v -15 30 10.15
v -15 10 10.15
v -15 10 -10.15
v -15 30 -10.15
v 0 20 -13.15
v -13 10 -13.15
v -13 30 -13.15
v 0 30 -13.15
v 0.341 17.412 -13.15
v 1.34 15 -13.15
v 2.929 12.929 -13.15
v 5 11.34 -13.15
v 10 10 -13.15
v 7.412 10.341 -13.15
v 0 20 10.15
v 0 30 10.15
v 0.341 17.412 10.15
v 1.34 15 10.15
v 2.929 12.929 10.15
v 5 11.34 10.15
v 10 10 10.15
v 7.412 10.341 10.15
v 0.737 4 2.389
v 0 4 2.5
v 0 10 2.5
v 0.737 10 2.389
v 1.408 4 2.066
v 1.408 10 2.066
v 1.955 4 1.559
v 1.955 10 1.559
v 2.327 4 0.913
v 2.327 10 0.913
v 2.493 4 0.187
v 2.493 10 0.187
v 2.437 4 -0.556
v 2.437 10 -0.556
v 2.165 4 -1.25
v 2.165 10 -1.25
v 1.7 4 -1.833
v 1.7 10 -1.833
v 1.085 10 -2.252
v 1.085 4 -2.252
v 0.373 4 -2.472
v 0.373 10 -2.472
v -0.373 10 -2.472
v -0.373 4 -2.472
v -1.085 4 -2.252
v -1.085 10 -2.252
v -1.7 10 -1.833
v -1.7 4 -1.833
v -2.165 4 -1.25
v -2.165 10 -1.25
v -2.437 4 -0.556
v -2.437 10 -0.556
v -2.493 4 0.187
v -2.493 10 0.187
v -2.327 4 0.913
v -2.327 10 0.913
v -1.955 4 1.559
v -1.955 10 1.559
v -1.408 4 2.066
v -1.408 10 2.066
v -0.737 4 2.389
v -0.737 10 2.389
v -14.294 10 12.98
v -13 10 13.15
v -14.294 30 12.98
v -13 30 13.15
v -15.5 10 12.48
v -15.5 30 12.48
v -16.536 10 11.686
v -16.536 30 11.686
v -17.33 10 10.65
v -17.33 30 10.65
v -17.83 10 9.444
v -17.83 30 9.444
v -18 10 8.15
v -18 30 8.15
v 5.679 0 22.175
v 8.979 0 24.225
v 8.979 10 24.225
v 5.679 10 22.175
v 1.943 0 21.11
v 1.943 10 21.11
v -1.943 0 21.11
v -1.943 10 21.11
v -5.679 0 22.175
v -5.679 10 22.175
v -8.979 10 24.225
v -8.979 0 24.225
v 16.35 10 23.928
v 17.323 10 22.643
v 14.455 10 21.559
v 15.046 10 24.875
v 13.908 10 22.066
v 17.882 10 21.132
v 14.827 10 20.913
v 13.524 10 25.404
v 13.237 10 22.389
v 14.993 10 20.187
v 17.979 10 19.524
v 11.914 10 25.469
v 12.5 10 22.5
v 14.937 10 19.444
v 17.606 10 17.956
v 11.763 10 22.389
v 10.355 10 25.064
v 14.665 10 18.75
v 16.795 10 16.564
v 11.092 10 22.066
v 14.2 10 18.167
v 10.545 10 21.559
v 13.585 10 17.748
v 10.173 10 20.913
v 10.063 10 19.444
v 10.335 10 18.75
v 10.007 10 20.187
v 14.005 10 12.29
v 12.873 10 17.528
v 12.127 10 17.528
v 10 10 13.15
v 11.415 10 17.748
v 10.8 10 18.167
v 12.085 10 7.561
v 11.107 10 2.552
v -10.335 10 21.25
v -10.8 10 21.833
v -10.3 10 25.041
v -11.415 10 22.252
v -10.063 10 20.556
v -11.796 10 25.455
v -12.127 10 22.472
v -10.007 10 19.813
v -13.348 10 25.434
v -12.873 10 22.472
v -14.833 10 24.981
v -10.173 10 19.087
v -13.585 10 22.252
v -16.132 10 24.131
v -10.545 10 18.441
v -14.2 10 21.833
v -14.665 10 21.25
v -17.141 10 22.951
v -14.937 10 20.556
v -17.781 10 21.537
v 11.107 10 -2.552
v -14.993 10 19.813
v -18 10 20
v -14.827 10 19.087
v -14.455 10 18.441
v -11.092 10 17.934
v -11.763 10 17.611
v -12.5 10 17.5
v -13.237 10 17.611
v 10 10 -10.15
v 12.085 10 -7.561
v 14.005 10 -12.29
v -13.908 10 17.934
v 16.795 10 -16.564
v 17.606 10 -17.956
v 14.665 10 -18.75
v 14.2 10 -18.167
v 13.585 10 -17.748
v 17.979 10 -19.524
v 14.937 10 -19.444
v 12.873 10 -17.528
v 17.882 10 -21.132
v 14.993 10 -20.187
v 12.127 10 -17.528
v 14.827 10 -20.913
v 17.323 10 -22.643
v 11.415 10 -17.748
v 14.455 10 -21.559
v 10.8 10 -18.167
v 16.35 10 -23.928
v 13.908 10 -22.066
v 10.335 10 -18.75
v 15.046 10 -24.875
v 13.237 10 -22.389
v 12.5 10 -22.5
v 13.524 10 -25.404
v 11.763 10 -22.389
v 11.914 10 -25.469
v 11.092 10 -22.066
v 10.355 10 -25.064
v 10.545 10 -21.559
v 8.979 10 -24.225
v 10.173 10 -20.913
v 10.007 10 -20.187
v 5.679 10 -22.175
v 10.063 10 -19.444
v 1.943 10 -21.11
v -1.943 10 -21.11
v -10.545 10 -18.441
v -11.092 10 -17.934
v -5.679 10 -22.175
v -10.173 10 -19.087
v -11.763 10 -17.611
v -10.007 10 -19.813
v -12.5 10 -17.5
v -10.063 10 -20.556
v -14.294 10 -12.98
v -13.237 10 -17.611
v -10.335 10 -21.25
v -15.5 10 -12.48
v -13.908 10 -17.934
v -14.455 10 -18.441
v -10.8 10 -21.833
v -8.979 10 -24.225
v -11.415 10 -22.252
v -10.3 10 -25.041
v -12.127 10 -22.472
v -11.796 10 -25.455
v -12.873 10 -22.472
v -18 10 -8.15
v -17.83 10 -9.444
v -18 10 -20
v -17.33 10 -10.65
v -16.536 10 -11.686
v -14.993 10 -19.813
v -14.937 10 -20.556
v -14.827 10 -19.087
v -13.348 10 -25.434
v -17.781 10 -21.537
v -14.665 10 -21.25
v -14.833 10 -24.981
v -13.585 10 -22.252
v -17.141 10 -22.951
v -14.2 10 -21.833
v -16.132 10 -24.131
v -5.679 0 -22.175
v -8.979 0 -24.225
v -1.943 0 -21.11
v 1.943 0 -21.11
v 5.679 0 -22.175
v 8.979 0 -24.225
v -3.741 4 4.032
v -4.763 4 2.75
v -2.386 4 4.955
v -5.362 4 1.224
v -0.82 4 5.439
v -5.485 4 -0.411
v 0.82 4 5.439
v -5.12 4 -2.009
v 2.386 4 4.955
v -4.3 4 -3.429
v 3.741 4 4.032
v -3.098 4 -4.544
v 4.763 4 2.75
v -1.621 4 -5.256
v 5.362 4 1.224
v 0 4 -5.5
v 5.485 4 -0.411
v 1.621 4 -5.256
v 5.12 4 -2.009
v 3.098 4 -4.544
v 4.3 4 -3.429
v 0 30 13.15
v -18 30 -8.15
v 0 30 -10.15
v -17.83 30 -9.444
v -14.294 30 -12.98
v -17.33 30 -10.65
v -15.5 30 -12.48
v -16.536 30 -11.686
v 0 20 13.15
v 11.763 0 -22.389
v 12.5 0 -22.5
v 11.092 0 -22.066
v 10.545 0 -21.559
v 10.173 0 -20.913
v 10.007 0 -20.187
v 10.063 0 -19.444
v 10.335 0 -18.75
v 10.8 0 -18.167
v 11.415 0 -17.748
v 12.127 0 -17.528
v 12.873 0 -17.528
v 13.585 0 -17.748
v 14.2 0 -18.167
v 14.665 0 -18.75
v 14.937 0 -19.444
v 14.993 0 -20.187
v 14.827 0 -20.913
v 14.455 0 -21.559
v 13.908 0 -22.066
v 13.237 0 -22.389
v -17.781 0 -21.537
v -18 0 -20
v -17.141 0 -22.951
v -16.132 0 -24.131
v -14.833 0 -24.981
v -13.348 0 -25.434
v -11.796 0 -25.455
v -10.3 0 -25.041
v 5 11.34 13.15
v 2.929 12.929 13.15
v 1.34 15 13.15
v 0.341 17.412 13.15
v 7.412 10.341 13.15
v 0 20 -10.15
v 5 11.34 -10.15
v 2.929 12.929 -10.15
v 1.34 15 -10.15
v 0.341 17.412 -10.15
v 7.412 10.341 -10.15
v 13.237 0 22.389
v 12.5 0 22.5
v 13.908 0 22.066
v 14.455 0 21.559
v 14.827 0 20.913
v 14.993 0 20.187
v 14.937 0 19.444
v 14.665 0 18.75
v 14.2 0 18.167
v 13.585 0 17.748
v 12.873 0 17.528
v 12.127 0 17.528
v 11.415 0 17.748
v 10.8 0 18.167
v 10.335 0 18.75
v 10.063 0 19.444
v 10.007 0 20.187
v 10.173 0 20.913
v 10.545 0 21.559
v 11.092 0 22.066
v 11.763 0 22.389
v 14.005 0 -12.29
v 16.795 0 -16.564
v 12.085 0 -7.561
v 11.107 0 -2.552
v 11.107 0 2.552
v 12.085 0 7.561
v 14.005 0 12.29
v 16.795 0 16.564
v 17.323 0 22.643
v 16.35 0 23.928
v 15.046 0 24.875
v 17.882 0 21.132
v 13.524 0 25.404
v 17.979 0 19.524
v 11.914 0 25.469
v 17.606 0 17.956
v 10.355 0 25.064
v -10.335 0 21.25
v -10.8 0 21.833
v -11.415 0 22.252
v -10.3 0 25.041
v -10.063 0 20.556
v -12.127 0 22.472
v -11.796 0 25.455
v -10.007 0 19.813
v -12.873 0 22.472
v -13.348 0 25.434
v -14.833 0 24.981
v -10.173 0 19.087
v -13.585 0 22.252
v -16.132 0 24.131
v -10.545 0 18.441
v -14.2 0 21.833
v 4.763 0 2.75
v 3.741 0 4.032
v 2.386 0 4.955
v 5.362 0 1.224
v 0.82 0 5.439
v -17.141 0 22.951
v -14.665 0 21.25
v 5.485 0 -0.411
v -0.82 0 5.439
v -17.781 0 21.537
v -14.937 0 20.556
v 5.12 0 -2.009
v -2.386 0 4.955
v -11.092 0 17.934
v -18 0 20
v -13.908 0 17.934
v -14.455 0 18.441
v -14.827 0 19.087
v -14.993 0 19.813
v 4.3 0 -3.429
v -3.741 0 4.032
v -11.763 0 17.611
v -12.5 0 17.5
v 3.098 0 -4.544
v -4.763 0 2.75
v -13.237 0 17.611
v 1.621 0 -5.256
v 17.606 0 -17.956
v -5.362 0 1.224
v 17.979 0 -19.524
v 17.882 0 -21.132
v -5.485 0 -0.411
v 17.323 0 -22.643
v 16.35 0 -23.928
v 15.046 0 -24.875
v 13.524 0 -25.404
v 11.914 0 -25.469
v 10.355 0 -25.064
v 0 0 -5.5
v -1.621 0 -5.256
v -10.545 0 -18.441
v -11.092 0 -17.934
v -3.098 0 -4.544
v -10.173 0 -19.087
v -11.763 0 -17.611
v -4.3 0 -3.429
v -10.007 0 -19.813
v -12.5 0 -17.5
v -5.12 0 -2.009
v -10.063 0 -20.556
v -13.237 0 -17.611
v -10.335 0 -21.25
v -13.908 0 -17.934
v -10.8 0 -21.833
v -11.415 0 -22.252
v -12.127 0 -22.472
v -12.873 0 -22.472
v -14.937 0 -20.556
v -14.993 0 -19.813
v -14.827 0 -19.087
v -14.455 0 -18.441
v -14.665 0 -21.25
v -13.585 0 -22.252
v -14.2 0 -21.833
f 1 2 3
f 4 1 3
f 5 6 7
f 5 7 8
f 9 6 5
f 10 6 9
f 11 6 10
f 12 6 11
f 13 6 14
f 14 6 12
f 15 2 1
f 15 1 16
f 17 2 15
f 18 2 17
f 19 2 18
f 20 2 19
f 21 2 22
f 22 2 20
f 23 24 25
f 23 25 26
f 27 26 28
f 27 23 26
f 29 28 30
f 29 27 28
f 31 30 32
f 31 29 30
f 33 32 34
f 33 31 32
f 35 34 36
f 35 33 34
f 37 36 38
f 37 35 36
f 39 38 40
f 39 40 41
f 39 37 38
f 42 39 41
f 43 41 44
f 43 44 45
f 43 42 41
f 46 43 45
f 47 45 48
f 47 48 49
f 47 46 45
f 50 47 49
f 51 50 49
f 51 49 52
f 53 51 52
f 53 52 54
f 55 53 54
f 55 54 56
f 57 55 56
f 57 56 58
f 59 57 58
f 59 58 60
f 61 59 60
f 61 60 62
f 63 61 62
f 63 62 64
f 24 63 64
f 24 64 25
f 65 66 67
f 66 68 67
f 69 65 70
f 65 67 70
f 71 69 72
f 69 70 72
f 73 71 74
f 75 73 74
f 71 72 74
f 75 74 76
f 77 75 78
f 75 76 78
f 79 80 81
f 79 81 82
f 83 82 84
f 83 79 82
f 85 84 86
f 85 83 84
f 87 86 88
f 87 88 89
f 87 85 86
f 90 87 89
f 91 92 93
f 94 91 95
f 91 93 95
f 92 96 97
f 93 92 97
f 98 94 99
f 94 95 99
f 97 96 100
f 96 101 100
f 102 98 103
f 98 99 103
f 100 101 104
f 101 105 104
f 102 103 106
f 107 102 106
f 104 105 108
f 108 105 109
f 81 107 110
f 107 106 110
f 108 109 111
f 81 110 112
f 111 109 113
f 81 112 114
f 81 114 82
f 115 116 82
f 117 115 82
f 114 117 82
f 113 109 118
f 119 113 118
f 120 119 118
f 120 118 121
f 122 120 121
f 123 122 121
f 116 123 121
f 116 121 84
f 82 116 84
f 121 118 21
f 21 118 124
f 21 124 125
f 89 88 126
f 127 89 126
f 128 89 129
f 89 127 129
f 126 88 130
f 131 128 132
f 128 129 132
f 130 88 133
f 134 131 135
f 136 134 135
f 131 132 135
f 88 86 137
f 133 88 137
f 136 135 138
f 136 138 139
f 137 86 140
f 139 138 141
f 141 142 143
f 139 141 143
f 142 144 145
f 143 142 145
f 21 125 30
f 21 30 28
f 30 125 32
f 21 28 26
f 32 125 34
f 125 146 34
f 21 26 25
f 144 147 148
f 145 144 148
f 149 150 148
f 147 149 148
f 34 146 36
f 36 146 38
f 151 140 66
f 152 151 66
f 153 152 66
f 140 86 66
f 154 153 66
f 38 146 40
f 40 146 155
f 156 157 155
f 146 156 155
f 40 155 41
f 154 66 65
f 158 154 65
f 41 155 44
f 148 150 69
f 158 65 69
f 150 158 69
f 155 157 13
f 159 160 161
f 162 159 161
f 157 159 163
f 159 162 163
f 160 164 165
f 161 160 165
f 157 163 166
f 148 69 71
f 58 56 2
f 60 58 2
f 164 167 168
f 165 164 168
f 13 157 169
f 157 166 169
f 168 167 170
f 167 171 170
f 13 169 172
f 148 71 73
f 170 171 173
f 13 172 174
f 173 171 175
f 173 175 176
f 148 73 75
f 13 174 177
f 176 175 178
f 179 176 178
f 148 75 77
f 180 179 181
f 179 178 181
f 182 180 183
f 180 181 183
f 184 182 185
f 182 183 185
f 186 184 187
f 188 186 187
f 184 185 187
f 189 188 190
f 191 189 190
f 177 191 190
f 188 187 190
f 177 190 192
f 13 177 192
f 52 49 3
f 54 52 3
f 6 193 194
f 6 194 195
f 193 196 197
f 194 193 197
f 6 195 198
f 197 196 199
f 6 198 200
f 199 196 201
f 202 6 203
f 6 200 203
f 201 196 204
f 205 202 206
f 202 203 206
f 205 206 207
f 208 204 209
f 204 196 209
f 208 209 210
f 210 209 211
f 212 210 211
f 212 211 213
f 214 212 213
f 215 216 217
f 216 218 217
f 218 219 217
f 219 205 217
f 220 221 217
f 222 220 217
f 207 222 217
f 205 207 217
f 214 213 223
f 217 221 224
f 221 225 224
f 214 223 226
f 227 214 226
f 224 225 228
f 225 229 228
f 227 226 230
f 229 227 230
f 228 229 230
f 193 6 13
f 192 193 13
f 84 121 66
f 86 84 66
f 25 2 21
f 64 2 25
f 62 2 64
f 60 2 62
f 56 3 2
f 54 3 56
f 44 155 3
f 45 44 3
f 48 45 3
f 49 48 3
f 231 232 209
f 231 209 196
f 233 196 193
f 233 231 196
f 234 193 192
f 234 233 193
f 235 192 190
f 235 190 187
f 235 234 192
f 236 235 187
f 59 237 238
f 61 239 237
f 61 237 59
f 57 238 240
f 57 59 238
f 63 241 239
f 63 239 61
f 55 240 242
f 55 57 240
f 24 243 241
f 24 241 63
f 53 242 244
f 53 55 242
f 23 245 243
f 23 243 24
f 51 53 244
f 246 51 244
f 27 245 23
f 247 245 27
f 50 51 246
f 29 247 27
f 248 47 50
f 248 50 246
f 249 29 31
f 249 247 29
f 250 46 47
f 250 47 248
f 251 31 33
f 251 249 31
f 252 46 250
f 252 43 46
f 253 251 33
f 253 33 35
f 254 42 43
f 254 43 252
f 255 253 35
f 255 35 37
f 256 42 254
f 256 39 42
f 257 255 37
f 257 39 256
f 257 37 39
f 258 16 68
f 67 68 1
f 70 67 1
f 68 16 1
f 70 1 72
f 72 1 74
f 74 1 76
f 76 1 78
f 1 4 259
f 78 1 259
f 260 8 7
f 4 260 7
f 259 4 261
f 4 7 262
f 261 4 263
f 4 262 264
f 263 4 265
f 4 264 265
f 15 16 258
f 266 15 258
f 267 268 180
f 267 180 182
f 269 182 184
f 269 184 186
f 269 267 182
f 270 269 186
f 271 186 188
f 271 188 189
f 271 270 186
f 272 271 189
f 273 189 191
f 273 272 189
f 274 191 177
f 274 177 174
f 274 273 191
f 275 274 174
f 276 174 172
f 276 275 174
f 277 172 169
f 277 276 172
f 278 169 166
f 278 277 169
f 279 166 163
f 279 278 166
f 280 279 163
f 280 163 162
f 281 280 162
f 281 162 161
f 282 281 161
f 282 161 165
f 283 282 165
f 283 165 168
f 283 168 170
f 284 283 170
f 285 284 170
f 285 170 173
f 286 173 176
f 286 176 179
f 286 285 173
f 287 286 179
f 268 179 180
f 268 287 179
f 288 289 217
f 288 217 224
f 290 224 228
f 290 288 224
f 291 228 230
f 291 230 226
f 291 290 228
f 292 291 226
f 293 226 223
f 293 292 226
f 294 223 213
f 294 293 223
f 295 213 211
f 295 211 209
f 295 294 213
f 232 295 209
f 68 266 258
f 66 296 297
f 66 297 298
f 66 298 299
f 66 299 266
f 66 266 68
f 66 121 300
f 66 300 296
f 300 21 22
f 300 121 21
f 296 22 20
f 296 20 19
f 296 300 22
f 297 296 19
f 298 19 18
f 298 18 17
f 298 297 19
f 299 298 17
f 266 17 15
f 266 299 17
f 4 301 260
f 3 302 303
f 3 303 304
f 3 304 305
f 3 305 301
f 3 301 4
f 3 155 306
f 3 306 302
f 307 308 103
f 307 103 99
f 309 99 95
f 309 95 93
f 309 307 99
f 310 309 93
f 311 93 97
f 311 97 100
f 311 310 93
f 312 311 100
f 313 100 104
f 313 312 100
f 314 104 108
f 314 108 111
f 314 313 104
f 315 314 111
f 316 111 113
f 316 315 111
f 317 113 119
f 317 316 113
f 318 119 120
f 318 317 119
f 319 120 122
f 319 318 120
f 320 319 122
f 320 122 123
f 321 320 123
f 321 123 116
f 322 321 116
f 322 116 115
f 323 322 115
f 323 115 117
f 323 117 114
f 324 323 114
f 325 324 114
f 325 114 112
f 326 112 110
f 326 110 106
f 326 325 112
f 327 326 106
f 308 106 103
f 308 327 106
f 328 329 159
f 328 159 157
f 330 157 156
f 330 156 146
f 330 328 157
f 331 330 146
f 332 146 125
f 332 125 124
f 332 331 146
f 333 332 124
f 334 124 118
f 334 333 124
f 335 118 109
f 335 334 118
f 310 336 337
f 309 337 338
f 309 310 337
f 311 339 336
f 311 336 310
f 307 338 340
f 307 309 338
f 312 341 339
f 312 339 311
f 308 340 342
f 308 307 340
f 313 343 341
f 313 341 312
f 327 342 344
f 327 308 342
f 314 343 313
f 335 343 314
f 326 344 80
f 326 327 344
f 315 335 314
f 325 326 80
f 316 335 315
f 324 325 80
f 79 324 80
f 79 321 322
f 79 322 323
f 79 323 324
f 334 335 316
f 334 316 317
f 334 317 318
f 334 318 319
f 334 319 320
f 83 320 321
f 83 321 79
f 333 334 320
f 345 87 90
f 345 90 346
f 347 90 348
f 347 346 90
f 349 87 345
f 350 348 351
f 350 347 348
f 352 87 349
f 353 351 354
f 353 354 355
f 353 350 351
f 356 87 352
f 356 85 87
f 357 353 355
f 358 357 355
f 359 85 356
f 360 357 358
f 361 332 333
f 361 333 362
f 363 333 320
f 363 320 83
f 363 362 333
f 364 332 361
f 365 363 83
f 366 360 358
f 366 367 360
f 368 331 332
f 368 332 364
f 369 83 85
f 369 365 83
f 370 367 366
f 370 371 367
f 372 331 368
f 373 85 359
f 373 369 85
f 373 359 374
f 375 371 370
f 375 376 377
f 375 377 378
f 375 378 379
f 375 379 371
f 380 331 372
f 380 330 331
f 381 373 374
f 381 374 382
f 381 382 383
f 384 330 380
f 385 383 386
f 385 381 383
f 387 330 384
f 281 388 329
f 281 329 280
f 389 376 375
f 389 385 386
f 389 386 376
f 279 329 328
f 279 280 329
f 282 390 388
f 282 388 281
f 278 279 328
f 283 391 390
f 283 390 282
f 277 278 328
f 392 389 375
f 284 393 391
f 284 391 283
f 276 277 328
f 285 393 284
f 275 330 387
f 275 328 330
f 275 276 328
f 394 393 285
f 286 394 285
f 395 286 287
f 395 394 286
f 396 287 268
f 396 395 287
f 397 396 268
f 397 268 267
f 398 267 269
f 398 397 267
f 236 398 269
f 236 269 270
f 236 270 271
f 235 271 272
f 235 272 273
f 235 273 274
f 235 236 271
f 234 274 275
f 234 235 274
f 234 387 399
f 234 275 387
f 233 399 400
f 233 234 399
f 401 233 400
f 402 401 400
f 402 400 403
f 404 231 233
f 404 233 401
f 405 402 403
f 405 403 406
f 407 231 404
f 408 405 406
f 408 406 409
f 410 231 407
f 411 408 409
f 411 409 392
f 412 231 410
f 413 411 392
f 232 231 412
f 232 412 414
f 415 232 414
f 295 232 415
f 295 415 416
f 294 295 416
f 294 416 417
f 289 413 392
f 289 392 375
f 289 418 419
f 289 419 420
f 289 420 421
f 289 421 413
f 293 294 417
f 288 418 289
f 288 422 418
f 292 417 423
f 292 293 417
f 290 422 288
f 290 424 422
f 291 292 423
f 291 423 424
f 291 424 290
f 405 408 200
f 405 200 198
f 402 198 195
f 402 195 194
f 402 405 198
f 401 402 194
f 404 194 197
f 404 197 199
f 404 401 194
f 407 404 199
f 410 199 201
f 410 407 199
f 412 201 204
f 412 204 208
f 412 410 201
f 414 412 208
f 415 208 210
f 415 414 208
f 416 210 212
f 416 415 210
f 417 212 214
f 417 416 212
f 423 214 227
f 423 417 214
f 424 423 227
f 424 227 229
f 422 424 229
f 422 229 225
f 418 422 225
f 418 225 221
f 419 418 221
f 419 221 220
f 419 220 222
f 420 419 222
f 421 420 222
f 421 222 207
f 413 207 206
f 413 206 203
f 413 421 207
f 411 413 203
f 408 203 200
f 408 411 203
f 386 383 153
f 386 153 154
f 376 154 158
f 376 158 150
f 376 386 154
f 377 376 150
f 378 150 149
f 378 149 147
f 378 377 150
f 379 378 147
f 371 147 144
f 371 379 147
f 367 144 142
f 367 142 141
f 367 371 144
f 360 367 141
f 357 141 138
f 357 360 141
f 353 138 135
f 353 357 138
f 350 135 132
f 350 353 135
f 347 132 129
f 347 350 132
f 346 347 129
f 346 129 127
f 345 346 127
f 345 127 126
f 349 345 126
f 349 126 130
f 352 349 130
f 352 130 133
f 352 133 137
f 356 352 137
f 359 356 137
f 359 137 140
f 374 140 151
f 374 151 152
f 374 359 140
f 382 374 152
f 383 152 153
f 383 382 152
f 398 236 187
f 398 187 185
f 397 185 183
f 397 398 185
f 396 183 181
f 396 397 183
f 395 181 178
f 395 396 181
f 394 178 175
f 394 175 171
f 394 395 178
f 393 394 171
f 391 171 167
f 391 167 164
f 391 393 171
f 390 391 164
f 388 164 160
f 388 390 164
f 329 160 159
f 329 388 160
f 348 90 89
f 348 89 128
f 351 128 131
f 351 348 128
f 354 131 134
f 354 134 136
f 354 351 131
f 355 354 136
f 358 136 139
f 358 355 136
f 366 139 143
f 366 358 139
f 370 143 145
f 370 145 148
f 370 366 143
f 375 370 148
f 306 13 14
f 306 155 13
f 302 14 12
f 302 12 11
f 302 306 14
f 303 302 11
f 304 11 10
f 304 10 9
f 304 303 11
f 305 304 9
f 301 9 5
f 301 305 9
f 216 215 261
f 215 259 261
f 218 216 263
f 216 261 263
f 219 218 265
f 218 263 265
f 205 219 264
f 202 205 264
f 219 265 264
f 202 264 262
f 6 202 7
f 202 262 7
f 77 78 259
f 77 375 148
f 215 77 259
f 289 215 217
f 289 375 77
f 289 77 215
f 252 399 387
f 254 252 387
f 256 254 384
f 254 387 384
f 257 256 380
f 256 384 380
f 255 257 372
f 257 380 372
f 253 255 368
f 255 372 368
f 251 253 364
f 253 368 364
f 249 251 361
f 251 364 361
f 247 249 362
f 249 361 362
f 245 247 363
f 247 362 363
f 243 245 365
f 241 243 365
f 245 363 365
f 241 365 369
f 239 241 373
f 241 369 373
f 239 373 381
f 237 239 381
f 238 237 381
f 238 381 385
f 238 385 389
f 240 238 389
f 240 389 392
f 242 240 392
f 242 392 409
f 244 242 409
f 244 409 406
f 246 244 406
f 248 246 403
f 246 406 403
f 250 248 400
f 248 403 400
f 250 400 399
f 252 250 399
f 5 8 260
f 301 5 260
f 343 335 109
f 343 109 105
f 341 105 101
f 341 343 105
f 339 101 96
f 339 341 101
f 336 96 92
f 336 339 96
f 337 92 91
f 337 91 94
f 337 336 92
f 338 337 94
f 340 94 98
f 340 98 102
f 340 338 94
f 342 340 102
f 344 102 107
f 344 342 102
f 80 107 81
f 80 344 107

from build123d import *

# Parameters (mm, degrees)
SKETCH1_R           = 2.5
BOSS_EXTRUDE1_DEPTH = 10
SKETCH3_R           = 5.5
CUT_EXTRUDE1_DEPTH  = 4
BOSS_EXTRUDE2_DEPTH = 20
FILLET1_R           = 10
FILLET2_R           = 5


with BuildPart() as part:
    # Sketch1 → Boss-Extrude1 (new body)
    with BuildSketch(Plane(origin=(0, 0, 0), x_dir=(1, 0, 0), z_dir=(0, 1, 0))):
        with BuildLine():
            Line((-18, -20), (-18, 20))
            ThreePointArc((-18, 20), (-14.832854679, 24.980741817), (-8.978985802, 24.225217038))
            ThreePointArc((-8.978985802, 24.225217038), (0, 20.97437581), (8.978985802, 24.225217038))
            ThreePointArc((8.978985802, 24.225217038), (16.350007855, 23.927777936), (16.794778452, 16.564177238))
            ThreePointArc((16.794778452, 16.564177238), (10.984378813, 0), (16.794778452, -16.564177238))
            ThreePointArc((16.794778452, -16.564177238), (16.350007855, -23.927777936), (8.978985802, -24.225217038))
            ThreePointArc((8.978985802, -24.225217038), (0, -20.97437581), (-8.978985802, -24.225217038))
            ThreePointArc((-8.978985802, -24.225217038), (-14.832854679, -24.980741817), (-18, -20))
        make_face()
        with Locations(Location((-12.5, 20, 0), (0, 0, 270))):
            Circle(SKETCH1_R, mode=Mode.SUBTRACT)
        with Locations(Location((12.5, 20, 0), (0, 0, 90))):
            Circle(SKETCH1_R, mode=Mode.SUBTRACT)
        with Locations(Location((12.5, -20, 0), (0, 0, 270))):
            Circle(SKETCH1_R, mode=Mode.SUBTRACT)
        with Locations(Location((-12.5, -20, 0), (0, 0, 90))):
            Circle(SKETCH1_R, mode=Mode.SUBTRACT)
        with Locations(Location((0, 0, 0), (0, 0, 270))):
            Circle(SKETCH1_R, mode=Mode.SUBTRACT)
    extrude(amount=BOSS_EXTRUDE1_DEPTH)

    # Sketch3 → Cut-Extrude1 (cut)
    with BuildSketch(Plane.XZ):
        with Locations(Location((0, 0, 0), (0, 0, 270))):
            Circle(SKETCH3_R)
    extrude(amount=-CUT_EXTRUDE1_DEPTH, mode=Mode.SUBTRACT)

    # Sketch4 → Boss-Extrude2 (add)
    with BuildSketch(Plane(origin=(0, 10, 0), x_dir=(1, 0, 0), z_dir=(0, 1, 0))):
        Polygon((0, 10.15), (-15, 10.15), (-15, 0), (-15, -10.15), (0, -10.15), (0, -13.15), (-18, -13.15), (-18, 0), (-18, 13.15), (0, 13.15), align=None)
    extrude(amount=BOSS_EXTRUDE2_DEPTH)

    # Fillet1
    fillet1_edges = [part.edges().sort_by_distance(p)[0] for p in [
        (0, 10, -11.65),
        (0, 10, 11.65),
    ]]
    fillet(fillet1_edges, radius=FILLET1_R)

    # Fillet2
    fillet2_edges = [part.edges().sort_by_distance(p)[0] for p in [
        (-18, 20, -13.15),
        (-18, 20, 13.15),
    ]]
    fillet(fillet2_edges, radius=FILLET2_R)


solid = part.part
